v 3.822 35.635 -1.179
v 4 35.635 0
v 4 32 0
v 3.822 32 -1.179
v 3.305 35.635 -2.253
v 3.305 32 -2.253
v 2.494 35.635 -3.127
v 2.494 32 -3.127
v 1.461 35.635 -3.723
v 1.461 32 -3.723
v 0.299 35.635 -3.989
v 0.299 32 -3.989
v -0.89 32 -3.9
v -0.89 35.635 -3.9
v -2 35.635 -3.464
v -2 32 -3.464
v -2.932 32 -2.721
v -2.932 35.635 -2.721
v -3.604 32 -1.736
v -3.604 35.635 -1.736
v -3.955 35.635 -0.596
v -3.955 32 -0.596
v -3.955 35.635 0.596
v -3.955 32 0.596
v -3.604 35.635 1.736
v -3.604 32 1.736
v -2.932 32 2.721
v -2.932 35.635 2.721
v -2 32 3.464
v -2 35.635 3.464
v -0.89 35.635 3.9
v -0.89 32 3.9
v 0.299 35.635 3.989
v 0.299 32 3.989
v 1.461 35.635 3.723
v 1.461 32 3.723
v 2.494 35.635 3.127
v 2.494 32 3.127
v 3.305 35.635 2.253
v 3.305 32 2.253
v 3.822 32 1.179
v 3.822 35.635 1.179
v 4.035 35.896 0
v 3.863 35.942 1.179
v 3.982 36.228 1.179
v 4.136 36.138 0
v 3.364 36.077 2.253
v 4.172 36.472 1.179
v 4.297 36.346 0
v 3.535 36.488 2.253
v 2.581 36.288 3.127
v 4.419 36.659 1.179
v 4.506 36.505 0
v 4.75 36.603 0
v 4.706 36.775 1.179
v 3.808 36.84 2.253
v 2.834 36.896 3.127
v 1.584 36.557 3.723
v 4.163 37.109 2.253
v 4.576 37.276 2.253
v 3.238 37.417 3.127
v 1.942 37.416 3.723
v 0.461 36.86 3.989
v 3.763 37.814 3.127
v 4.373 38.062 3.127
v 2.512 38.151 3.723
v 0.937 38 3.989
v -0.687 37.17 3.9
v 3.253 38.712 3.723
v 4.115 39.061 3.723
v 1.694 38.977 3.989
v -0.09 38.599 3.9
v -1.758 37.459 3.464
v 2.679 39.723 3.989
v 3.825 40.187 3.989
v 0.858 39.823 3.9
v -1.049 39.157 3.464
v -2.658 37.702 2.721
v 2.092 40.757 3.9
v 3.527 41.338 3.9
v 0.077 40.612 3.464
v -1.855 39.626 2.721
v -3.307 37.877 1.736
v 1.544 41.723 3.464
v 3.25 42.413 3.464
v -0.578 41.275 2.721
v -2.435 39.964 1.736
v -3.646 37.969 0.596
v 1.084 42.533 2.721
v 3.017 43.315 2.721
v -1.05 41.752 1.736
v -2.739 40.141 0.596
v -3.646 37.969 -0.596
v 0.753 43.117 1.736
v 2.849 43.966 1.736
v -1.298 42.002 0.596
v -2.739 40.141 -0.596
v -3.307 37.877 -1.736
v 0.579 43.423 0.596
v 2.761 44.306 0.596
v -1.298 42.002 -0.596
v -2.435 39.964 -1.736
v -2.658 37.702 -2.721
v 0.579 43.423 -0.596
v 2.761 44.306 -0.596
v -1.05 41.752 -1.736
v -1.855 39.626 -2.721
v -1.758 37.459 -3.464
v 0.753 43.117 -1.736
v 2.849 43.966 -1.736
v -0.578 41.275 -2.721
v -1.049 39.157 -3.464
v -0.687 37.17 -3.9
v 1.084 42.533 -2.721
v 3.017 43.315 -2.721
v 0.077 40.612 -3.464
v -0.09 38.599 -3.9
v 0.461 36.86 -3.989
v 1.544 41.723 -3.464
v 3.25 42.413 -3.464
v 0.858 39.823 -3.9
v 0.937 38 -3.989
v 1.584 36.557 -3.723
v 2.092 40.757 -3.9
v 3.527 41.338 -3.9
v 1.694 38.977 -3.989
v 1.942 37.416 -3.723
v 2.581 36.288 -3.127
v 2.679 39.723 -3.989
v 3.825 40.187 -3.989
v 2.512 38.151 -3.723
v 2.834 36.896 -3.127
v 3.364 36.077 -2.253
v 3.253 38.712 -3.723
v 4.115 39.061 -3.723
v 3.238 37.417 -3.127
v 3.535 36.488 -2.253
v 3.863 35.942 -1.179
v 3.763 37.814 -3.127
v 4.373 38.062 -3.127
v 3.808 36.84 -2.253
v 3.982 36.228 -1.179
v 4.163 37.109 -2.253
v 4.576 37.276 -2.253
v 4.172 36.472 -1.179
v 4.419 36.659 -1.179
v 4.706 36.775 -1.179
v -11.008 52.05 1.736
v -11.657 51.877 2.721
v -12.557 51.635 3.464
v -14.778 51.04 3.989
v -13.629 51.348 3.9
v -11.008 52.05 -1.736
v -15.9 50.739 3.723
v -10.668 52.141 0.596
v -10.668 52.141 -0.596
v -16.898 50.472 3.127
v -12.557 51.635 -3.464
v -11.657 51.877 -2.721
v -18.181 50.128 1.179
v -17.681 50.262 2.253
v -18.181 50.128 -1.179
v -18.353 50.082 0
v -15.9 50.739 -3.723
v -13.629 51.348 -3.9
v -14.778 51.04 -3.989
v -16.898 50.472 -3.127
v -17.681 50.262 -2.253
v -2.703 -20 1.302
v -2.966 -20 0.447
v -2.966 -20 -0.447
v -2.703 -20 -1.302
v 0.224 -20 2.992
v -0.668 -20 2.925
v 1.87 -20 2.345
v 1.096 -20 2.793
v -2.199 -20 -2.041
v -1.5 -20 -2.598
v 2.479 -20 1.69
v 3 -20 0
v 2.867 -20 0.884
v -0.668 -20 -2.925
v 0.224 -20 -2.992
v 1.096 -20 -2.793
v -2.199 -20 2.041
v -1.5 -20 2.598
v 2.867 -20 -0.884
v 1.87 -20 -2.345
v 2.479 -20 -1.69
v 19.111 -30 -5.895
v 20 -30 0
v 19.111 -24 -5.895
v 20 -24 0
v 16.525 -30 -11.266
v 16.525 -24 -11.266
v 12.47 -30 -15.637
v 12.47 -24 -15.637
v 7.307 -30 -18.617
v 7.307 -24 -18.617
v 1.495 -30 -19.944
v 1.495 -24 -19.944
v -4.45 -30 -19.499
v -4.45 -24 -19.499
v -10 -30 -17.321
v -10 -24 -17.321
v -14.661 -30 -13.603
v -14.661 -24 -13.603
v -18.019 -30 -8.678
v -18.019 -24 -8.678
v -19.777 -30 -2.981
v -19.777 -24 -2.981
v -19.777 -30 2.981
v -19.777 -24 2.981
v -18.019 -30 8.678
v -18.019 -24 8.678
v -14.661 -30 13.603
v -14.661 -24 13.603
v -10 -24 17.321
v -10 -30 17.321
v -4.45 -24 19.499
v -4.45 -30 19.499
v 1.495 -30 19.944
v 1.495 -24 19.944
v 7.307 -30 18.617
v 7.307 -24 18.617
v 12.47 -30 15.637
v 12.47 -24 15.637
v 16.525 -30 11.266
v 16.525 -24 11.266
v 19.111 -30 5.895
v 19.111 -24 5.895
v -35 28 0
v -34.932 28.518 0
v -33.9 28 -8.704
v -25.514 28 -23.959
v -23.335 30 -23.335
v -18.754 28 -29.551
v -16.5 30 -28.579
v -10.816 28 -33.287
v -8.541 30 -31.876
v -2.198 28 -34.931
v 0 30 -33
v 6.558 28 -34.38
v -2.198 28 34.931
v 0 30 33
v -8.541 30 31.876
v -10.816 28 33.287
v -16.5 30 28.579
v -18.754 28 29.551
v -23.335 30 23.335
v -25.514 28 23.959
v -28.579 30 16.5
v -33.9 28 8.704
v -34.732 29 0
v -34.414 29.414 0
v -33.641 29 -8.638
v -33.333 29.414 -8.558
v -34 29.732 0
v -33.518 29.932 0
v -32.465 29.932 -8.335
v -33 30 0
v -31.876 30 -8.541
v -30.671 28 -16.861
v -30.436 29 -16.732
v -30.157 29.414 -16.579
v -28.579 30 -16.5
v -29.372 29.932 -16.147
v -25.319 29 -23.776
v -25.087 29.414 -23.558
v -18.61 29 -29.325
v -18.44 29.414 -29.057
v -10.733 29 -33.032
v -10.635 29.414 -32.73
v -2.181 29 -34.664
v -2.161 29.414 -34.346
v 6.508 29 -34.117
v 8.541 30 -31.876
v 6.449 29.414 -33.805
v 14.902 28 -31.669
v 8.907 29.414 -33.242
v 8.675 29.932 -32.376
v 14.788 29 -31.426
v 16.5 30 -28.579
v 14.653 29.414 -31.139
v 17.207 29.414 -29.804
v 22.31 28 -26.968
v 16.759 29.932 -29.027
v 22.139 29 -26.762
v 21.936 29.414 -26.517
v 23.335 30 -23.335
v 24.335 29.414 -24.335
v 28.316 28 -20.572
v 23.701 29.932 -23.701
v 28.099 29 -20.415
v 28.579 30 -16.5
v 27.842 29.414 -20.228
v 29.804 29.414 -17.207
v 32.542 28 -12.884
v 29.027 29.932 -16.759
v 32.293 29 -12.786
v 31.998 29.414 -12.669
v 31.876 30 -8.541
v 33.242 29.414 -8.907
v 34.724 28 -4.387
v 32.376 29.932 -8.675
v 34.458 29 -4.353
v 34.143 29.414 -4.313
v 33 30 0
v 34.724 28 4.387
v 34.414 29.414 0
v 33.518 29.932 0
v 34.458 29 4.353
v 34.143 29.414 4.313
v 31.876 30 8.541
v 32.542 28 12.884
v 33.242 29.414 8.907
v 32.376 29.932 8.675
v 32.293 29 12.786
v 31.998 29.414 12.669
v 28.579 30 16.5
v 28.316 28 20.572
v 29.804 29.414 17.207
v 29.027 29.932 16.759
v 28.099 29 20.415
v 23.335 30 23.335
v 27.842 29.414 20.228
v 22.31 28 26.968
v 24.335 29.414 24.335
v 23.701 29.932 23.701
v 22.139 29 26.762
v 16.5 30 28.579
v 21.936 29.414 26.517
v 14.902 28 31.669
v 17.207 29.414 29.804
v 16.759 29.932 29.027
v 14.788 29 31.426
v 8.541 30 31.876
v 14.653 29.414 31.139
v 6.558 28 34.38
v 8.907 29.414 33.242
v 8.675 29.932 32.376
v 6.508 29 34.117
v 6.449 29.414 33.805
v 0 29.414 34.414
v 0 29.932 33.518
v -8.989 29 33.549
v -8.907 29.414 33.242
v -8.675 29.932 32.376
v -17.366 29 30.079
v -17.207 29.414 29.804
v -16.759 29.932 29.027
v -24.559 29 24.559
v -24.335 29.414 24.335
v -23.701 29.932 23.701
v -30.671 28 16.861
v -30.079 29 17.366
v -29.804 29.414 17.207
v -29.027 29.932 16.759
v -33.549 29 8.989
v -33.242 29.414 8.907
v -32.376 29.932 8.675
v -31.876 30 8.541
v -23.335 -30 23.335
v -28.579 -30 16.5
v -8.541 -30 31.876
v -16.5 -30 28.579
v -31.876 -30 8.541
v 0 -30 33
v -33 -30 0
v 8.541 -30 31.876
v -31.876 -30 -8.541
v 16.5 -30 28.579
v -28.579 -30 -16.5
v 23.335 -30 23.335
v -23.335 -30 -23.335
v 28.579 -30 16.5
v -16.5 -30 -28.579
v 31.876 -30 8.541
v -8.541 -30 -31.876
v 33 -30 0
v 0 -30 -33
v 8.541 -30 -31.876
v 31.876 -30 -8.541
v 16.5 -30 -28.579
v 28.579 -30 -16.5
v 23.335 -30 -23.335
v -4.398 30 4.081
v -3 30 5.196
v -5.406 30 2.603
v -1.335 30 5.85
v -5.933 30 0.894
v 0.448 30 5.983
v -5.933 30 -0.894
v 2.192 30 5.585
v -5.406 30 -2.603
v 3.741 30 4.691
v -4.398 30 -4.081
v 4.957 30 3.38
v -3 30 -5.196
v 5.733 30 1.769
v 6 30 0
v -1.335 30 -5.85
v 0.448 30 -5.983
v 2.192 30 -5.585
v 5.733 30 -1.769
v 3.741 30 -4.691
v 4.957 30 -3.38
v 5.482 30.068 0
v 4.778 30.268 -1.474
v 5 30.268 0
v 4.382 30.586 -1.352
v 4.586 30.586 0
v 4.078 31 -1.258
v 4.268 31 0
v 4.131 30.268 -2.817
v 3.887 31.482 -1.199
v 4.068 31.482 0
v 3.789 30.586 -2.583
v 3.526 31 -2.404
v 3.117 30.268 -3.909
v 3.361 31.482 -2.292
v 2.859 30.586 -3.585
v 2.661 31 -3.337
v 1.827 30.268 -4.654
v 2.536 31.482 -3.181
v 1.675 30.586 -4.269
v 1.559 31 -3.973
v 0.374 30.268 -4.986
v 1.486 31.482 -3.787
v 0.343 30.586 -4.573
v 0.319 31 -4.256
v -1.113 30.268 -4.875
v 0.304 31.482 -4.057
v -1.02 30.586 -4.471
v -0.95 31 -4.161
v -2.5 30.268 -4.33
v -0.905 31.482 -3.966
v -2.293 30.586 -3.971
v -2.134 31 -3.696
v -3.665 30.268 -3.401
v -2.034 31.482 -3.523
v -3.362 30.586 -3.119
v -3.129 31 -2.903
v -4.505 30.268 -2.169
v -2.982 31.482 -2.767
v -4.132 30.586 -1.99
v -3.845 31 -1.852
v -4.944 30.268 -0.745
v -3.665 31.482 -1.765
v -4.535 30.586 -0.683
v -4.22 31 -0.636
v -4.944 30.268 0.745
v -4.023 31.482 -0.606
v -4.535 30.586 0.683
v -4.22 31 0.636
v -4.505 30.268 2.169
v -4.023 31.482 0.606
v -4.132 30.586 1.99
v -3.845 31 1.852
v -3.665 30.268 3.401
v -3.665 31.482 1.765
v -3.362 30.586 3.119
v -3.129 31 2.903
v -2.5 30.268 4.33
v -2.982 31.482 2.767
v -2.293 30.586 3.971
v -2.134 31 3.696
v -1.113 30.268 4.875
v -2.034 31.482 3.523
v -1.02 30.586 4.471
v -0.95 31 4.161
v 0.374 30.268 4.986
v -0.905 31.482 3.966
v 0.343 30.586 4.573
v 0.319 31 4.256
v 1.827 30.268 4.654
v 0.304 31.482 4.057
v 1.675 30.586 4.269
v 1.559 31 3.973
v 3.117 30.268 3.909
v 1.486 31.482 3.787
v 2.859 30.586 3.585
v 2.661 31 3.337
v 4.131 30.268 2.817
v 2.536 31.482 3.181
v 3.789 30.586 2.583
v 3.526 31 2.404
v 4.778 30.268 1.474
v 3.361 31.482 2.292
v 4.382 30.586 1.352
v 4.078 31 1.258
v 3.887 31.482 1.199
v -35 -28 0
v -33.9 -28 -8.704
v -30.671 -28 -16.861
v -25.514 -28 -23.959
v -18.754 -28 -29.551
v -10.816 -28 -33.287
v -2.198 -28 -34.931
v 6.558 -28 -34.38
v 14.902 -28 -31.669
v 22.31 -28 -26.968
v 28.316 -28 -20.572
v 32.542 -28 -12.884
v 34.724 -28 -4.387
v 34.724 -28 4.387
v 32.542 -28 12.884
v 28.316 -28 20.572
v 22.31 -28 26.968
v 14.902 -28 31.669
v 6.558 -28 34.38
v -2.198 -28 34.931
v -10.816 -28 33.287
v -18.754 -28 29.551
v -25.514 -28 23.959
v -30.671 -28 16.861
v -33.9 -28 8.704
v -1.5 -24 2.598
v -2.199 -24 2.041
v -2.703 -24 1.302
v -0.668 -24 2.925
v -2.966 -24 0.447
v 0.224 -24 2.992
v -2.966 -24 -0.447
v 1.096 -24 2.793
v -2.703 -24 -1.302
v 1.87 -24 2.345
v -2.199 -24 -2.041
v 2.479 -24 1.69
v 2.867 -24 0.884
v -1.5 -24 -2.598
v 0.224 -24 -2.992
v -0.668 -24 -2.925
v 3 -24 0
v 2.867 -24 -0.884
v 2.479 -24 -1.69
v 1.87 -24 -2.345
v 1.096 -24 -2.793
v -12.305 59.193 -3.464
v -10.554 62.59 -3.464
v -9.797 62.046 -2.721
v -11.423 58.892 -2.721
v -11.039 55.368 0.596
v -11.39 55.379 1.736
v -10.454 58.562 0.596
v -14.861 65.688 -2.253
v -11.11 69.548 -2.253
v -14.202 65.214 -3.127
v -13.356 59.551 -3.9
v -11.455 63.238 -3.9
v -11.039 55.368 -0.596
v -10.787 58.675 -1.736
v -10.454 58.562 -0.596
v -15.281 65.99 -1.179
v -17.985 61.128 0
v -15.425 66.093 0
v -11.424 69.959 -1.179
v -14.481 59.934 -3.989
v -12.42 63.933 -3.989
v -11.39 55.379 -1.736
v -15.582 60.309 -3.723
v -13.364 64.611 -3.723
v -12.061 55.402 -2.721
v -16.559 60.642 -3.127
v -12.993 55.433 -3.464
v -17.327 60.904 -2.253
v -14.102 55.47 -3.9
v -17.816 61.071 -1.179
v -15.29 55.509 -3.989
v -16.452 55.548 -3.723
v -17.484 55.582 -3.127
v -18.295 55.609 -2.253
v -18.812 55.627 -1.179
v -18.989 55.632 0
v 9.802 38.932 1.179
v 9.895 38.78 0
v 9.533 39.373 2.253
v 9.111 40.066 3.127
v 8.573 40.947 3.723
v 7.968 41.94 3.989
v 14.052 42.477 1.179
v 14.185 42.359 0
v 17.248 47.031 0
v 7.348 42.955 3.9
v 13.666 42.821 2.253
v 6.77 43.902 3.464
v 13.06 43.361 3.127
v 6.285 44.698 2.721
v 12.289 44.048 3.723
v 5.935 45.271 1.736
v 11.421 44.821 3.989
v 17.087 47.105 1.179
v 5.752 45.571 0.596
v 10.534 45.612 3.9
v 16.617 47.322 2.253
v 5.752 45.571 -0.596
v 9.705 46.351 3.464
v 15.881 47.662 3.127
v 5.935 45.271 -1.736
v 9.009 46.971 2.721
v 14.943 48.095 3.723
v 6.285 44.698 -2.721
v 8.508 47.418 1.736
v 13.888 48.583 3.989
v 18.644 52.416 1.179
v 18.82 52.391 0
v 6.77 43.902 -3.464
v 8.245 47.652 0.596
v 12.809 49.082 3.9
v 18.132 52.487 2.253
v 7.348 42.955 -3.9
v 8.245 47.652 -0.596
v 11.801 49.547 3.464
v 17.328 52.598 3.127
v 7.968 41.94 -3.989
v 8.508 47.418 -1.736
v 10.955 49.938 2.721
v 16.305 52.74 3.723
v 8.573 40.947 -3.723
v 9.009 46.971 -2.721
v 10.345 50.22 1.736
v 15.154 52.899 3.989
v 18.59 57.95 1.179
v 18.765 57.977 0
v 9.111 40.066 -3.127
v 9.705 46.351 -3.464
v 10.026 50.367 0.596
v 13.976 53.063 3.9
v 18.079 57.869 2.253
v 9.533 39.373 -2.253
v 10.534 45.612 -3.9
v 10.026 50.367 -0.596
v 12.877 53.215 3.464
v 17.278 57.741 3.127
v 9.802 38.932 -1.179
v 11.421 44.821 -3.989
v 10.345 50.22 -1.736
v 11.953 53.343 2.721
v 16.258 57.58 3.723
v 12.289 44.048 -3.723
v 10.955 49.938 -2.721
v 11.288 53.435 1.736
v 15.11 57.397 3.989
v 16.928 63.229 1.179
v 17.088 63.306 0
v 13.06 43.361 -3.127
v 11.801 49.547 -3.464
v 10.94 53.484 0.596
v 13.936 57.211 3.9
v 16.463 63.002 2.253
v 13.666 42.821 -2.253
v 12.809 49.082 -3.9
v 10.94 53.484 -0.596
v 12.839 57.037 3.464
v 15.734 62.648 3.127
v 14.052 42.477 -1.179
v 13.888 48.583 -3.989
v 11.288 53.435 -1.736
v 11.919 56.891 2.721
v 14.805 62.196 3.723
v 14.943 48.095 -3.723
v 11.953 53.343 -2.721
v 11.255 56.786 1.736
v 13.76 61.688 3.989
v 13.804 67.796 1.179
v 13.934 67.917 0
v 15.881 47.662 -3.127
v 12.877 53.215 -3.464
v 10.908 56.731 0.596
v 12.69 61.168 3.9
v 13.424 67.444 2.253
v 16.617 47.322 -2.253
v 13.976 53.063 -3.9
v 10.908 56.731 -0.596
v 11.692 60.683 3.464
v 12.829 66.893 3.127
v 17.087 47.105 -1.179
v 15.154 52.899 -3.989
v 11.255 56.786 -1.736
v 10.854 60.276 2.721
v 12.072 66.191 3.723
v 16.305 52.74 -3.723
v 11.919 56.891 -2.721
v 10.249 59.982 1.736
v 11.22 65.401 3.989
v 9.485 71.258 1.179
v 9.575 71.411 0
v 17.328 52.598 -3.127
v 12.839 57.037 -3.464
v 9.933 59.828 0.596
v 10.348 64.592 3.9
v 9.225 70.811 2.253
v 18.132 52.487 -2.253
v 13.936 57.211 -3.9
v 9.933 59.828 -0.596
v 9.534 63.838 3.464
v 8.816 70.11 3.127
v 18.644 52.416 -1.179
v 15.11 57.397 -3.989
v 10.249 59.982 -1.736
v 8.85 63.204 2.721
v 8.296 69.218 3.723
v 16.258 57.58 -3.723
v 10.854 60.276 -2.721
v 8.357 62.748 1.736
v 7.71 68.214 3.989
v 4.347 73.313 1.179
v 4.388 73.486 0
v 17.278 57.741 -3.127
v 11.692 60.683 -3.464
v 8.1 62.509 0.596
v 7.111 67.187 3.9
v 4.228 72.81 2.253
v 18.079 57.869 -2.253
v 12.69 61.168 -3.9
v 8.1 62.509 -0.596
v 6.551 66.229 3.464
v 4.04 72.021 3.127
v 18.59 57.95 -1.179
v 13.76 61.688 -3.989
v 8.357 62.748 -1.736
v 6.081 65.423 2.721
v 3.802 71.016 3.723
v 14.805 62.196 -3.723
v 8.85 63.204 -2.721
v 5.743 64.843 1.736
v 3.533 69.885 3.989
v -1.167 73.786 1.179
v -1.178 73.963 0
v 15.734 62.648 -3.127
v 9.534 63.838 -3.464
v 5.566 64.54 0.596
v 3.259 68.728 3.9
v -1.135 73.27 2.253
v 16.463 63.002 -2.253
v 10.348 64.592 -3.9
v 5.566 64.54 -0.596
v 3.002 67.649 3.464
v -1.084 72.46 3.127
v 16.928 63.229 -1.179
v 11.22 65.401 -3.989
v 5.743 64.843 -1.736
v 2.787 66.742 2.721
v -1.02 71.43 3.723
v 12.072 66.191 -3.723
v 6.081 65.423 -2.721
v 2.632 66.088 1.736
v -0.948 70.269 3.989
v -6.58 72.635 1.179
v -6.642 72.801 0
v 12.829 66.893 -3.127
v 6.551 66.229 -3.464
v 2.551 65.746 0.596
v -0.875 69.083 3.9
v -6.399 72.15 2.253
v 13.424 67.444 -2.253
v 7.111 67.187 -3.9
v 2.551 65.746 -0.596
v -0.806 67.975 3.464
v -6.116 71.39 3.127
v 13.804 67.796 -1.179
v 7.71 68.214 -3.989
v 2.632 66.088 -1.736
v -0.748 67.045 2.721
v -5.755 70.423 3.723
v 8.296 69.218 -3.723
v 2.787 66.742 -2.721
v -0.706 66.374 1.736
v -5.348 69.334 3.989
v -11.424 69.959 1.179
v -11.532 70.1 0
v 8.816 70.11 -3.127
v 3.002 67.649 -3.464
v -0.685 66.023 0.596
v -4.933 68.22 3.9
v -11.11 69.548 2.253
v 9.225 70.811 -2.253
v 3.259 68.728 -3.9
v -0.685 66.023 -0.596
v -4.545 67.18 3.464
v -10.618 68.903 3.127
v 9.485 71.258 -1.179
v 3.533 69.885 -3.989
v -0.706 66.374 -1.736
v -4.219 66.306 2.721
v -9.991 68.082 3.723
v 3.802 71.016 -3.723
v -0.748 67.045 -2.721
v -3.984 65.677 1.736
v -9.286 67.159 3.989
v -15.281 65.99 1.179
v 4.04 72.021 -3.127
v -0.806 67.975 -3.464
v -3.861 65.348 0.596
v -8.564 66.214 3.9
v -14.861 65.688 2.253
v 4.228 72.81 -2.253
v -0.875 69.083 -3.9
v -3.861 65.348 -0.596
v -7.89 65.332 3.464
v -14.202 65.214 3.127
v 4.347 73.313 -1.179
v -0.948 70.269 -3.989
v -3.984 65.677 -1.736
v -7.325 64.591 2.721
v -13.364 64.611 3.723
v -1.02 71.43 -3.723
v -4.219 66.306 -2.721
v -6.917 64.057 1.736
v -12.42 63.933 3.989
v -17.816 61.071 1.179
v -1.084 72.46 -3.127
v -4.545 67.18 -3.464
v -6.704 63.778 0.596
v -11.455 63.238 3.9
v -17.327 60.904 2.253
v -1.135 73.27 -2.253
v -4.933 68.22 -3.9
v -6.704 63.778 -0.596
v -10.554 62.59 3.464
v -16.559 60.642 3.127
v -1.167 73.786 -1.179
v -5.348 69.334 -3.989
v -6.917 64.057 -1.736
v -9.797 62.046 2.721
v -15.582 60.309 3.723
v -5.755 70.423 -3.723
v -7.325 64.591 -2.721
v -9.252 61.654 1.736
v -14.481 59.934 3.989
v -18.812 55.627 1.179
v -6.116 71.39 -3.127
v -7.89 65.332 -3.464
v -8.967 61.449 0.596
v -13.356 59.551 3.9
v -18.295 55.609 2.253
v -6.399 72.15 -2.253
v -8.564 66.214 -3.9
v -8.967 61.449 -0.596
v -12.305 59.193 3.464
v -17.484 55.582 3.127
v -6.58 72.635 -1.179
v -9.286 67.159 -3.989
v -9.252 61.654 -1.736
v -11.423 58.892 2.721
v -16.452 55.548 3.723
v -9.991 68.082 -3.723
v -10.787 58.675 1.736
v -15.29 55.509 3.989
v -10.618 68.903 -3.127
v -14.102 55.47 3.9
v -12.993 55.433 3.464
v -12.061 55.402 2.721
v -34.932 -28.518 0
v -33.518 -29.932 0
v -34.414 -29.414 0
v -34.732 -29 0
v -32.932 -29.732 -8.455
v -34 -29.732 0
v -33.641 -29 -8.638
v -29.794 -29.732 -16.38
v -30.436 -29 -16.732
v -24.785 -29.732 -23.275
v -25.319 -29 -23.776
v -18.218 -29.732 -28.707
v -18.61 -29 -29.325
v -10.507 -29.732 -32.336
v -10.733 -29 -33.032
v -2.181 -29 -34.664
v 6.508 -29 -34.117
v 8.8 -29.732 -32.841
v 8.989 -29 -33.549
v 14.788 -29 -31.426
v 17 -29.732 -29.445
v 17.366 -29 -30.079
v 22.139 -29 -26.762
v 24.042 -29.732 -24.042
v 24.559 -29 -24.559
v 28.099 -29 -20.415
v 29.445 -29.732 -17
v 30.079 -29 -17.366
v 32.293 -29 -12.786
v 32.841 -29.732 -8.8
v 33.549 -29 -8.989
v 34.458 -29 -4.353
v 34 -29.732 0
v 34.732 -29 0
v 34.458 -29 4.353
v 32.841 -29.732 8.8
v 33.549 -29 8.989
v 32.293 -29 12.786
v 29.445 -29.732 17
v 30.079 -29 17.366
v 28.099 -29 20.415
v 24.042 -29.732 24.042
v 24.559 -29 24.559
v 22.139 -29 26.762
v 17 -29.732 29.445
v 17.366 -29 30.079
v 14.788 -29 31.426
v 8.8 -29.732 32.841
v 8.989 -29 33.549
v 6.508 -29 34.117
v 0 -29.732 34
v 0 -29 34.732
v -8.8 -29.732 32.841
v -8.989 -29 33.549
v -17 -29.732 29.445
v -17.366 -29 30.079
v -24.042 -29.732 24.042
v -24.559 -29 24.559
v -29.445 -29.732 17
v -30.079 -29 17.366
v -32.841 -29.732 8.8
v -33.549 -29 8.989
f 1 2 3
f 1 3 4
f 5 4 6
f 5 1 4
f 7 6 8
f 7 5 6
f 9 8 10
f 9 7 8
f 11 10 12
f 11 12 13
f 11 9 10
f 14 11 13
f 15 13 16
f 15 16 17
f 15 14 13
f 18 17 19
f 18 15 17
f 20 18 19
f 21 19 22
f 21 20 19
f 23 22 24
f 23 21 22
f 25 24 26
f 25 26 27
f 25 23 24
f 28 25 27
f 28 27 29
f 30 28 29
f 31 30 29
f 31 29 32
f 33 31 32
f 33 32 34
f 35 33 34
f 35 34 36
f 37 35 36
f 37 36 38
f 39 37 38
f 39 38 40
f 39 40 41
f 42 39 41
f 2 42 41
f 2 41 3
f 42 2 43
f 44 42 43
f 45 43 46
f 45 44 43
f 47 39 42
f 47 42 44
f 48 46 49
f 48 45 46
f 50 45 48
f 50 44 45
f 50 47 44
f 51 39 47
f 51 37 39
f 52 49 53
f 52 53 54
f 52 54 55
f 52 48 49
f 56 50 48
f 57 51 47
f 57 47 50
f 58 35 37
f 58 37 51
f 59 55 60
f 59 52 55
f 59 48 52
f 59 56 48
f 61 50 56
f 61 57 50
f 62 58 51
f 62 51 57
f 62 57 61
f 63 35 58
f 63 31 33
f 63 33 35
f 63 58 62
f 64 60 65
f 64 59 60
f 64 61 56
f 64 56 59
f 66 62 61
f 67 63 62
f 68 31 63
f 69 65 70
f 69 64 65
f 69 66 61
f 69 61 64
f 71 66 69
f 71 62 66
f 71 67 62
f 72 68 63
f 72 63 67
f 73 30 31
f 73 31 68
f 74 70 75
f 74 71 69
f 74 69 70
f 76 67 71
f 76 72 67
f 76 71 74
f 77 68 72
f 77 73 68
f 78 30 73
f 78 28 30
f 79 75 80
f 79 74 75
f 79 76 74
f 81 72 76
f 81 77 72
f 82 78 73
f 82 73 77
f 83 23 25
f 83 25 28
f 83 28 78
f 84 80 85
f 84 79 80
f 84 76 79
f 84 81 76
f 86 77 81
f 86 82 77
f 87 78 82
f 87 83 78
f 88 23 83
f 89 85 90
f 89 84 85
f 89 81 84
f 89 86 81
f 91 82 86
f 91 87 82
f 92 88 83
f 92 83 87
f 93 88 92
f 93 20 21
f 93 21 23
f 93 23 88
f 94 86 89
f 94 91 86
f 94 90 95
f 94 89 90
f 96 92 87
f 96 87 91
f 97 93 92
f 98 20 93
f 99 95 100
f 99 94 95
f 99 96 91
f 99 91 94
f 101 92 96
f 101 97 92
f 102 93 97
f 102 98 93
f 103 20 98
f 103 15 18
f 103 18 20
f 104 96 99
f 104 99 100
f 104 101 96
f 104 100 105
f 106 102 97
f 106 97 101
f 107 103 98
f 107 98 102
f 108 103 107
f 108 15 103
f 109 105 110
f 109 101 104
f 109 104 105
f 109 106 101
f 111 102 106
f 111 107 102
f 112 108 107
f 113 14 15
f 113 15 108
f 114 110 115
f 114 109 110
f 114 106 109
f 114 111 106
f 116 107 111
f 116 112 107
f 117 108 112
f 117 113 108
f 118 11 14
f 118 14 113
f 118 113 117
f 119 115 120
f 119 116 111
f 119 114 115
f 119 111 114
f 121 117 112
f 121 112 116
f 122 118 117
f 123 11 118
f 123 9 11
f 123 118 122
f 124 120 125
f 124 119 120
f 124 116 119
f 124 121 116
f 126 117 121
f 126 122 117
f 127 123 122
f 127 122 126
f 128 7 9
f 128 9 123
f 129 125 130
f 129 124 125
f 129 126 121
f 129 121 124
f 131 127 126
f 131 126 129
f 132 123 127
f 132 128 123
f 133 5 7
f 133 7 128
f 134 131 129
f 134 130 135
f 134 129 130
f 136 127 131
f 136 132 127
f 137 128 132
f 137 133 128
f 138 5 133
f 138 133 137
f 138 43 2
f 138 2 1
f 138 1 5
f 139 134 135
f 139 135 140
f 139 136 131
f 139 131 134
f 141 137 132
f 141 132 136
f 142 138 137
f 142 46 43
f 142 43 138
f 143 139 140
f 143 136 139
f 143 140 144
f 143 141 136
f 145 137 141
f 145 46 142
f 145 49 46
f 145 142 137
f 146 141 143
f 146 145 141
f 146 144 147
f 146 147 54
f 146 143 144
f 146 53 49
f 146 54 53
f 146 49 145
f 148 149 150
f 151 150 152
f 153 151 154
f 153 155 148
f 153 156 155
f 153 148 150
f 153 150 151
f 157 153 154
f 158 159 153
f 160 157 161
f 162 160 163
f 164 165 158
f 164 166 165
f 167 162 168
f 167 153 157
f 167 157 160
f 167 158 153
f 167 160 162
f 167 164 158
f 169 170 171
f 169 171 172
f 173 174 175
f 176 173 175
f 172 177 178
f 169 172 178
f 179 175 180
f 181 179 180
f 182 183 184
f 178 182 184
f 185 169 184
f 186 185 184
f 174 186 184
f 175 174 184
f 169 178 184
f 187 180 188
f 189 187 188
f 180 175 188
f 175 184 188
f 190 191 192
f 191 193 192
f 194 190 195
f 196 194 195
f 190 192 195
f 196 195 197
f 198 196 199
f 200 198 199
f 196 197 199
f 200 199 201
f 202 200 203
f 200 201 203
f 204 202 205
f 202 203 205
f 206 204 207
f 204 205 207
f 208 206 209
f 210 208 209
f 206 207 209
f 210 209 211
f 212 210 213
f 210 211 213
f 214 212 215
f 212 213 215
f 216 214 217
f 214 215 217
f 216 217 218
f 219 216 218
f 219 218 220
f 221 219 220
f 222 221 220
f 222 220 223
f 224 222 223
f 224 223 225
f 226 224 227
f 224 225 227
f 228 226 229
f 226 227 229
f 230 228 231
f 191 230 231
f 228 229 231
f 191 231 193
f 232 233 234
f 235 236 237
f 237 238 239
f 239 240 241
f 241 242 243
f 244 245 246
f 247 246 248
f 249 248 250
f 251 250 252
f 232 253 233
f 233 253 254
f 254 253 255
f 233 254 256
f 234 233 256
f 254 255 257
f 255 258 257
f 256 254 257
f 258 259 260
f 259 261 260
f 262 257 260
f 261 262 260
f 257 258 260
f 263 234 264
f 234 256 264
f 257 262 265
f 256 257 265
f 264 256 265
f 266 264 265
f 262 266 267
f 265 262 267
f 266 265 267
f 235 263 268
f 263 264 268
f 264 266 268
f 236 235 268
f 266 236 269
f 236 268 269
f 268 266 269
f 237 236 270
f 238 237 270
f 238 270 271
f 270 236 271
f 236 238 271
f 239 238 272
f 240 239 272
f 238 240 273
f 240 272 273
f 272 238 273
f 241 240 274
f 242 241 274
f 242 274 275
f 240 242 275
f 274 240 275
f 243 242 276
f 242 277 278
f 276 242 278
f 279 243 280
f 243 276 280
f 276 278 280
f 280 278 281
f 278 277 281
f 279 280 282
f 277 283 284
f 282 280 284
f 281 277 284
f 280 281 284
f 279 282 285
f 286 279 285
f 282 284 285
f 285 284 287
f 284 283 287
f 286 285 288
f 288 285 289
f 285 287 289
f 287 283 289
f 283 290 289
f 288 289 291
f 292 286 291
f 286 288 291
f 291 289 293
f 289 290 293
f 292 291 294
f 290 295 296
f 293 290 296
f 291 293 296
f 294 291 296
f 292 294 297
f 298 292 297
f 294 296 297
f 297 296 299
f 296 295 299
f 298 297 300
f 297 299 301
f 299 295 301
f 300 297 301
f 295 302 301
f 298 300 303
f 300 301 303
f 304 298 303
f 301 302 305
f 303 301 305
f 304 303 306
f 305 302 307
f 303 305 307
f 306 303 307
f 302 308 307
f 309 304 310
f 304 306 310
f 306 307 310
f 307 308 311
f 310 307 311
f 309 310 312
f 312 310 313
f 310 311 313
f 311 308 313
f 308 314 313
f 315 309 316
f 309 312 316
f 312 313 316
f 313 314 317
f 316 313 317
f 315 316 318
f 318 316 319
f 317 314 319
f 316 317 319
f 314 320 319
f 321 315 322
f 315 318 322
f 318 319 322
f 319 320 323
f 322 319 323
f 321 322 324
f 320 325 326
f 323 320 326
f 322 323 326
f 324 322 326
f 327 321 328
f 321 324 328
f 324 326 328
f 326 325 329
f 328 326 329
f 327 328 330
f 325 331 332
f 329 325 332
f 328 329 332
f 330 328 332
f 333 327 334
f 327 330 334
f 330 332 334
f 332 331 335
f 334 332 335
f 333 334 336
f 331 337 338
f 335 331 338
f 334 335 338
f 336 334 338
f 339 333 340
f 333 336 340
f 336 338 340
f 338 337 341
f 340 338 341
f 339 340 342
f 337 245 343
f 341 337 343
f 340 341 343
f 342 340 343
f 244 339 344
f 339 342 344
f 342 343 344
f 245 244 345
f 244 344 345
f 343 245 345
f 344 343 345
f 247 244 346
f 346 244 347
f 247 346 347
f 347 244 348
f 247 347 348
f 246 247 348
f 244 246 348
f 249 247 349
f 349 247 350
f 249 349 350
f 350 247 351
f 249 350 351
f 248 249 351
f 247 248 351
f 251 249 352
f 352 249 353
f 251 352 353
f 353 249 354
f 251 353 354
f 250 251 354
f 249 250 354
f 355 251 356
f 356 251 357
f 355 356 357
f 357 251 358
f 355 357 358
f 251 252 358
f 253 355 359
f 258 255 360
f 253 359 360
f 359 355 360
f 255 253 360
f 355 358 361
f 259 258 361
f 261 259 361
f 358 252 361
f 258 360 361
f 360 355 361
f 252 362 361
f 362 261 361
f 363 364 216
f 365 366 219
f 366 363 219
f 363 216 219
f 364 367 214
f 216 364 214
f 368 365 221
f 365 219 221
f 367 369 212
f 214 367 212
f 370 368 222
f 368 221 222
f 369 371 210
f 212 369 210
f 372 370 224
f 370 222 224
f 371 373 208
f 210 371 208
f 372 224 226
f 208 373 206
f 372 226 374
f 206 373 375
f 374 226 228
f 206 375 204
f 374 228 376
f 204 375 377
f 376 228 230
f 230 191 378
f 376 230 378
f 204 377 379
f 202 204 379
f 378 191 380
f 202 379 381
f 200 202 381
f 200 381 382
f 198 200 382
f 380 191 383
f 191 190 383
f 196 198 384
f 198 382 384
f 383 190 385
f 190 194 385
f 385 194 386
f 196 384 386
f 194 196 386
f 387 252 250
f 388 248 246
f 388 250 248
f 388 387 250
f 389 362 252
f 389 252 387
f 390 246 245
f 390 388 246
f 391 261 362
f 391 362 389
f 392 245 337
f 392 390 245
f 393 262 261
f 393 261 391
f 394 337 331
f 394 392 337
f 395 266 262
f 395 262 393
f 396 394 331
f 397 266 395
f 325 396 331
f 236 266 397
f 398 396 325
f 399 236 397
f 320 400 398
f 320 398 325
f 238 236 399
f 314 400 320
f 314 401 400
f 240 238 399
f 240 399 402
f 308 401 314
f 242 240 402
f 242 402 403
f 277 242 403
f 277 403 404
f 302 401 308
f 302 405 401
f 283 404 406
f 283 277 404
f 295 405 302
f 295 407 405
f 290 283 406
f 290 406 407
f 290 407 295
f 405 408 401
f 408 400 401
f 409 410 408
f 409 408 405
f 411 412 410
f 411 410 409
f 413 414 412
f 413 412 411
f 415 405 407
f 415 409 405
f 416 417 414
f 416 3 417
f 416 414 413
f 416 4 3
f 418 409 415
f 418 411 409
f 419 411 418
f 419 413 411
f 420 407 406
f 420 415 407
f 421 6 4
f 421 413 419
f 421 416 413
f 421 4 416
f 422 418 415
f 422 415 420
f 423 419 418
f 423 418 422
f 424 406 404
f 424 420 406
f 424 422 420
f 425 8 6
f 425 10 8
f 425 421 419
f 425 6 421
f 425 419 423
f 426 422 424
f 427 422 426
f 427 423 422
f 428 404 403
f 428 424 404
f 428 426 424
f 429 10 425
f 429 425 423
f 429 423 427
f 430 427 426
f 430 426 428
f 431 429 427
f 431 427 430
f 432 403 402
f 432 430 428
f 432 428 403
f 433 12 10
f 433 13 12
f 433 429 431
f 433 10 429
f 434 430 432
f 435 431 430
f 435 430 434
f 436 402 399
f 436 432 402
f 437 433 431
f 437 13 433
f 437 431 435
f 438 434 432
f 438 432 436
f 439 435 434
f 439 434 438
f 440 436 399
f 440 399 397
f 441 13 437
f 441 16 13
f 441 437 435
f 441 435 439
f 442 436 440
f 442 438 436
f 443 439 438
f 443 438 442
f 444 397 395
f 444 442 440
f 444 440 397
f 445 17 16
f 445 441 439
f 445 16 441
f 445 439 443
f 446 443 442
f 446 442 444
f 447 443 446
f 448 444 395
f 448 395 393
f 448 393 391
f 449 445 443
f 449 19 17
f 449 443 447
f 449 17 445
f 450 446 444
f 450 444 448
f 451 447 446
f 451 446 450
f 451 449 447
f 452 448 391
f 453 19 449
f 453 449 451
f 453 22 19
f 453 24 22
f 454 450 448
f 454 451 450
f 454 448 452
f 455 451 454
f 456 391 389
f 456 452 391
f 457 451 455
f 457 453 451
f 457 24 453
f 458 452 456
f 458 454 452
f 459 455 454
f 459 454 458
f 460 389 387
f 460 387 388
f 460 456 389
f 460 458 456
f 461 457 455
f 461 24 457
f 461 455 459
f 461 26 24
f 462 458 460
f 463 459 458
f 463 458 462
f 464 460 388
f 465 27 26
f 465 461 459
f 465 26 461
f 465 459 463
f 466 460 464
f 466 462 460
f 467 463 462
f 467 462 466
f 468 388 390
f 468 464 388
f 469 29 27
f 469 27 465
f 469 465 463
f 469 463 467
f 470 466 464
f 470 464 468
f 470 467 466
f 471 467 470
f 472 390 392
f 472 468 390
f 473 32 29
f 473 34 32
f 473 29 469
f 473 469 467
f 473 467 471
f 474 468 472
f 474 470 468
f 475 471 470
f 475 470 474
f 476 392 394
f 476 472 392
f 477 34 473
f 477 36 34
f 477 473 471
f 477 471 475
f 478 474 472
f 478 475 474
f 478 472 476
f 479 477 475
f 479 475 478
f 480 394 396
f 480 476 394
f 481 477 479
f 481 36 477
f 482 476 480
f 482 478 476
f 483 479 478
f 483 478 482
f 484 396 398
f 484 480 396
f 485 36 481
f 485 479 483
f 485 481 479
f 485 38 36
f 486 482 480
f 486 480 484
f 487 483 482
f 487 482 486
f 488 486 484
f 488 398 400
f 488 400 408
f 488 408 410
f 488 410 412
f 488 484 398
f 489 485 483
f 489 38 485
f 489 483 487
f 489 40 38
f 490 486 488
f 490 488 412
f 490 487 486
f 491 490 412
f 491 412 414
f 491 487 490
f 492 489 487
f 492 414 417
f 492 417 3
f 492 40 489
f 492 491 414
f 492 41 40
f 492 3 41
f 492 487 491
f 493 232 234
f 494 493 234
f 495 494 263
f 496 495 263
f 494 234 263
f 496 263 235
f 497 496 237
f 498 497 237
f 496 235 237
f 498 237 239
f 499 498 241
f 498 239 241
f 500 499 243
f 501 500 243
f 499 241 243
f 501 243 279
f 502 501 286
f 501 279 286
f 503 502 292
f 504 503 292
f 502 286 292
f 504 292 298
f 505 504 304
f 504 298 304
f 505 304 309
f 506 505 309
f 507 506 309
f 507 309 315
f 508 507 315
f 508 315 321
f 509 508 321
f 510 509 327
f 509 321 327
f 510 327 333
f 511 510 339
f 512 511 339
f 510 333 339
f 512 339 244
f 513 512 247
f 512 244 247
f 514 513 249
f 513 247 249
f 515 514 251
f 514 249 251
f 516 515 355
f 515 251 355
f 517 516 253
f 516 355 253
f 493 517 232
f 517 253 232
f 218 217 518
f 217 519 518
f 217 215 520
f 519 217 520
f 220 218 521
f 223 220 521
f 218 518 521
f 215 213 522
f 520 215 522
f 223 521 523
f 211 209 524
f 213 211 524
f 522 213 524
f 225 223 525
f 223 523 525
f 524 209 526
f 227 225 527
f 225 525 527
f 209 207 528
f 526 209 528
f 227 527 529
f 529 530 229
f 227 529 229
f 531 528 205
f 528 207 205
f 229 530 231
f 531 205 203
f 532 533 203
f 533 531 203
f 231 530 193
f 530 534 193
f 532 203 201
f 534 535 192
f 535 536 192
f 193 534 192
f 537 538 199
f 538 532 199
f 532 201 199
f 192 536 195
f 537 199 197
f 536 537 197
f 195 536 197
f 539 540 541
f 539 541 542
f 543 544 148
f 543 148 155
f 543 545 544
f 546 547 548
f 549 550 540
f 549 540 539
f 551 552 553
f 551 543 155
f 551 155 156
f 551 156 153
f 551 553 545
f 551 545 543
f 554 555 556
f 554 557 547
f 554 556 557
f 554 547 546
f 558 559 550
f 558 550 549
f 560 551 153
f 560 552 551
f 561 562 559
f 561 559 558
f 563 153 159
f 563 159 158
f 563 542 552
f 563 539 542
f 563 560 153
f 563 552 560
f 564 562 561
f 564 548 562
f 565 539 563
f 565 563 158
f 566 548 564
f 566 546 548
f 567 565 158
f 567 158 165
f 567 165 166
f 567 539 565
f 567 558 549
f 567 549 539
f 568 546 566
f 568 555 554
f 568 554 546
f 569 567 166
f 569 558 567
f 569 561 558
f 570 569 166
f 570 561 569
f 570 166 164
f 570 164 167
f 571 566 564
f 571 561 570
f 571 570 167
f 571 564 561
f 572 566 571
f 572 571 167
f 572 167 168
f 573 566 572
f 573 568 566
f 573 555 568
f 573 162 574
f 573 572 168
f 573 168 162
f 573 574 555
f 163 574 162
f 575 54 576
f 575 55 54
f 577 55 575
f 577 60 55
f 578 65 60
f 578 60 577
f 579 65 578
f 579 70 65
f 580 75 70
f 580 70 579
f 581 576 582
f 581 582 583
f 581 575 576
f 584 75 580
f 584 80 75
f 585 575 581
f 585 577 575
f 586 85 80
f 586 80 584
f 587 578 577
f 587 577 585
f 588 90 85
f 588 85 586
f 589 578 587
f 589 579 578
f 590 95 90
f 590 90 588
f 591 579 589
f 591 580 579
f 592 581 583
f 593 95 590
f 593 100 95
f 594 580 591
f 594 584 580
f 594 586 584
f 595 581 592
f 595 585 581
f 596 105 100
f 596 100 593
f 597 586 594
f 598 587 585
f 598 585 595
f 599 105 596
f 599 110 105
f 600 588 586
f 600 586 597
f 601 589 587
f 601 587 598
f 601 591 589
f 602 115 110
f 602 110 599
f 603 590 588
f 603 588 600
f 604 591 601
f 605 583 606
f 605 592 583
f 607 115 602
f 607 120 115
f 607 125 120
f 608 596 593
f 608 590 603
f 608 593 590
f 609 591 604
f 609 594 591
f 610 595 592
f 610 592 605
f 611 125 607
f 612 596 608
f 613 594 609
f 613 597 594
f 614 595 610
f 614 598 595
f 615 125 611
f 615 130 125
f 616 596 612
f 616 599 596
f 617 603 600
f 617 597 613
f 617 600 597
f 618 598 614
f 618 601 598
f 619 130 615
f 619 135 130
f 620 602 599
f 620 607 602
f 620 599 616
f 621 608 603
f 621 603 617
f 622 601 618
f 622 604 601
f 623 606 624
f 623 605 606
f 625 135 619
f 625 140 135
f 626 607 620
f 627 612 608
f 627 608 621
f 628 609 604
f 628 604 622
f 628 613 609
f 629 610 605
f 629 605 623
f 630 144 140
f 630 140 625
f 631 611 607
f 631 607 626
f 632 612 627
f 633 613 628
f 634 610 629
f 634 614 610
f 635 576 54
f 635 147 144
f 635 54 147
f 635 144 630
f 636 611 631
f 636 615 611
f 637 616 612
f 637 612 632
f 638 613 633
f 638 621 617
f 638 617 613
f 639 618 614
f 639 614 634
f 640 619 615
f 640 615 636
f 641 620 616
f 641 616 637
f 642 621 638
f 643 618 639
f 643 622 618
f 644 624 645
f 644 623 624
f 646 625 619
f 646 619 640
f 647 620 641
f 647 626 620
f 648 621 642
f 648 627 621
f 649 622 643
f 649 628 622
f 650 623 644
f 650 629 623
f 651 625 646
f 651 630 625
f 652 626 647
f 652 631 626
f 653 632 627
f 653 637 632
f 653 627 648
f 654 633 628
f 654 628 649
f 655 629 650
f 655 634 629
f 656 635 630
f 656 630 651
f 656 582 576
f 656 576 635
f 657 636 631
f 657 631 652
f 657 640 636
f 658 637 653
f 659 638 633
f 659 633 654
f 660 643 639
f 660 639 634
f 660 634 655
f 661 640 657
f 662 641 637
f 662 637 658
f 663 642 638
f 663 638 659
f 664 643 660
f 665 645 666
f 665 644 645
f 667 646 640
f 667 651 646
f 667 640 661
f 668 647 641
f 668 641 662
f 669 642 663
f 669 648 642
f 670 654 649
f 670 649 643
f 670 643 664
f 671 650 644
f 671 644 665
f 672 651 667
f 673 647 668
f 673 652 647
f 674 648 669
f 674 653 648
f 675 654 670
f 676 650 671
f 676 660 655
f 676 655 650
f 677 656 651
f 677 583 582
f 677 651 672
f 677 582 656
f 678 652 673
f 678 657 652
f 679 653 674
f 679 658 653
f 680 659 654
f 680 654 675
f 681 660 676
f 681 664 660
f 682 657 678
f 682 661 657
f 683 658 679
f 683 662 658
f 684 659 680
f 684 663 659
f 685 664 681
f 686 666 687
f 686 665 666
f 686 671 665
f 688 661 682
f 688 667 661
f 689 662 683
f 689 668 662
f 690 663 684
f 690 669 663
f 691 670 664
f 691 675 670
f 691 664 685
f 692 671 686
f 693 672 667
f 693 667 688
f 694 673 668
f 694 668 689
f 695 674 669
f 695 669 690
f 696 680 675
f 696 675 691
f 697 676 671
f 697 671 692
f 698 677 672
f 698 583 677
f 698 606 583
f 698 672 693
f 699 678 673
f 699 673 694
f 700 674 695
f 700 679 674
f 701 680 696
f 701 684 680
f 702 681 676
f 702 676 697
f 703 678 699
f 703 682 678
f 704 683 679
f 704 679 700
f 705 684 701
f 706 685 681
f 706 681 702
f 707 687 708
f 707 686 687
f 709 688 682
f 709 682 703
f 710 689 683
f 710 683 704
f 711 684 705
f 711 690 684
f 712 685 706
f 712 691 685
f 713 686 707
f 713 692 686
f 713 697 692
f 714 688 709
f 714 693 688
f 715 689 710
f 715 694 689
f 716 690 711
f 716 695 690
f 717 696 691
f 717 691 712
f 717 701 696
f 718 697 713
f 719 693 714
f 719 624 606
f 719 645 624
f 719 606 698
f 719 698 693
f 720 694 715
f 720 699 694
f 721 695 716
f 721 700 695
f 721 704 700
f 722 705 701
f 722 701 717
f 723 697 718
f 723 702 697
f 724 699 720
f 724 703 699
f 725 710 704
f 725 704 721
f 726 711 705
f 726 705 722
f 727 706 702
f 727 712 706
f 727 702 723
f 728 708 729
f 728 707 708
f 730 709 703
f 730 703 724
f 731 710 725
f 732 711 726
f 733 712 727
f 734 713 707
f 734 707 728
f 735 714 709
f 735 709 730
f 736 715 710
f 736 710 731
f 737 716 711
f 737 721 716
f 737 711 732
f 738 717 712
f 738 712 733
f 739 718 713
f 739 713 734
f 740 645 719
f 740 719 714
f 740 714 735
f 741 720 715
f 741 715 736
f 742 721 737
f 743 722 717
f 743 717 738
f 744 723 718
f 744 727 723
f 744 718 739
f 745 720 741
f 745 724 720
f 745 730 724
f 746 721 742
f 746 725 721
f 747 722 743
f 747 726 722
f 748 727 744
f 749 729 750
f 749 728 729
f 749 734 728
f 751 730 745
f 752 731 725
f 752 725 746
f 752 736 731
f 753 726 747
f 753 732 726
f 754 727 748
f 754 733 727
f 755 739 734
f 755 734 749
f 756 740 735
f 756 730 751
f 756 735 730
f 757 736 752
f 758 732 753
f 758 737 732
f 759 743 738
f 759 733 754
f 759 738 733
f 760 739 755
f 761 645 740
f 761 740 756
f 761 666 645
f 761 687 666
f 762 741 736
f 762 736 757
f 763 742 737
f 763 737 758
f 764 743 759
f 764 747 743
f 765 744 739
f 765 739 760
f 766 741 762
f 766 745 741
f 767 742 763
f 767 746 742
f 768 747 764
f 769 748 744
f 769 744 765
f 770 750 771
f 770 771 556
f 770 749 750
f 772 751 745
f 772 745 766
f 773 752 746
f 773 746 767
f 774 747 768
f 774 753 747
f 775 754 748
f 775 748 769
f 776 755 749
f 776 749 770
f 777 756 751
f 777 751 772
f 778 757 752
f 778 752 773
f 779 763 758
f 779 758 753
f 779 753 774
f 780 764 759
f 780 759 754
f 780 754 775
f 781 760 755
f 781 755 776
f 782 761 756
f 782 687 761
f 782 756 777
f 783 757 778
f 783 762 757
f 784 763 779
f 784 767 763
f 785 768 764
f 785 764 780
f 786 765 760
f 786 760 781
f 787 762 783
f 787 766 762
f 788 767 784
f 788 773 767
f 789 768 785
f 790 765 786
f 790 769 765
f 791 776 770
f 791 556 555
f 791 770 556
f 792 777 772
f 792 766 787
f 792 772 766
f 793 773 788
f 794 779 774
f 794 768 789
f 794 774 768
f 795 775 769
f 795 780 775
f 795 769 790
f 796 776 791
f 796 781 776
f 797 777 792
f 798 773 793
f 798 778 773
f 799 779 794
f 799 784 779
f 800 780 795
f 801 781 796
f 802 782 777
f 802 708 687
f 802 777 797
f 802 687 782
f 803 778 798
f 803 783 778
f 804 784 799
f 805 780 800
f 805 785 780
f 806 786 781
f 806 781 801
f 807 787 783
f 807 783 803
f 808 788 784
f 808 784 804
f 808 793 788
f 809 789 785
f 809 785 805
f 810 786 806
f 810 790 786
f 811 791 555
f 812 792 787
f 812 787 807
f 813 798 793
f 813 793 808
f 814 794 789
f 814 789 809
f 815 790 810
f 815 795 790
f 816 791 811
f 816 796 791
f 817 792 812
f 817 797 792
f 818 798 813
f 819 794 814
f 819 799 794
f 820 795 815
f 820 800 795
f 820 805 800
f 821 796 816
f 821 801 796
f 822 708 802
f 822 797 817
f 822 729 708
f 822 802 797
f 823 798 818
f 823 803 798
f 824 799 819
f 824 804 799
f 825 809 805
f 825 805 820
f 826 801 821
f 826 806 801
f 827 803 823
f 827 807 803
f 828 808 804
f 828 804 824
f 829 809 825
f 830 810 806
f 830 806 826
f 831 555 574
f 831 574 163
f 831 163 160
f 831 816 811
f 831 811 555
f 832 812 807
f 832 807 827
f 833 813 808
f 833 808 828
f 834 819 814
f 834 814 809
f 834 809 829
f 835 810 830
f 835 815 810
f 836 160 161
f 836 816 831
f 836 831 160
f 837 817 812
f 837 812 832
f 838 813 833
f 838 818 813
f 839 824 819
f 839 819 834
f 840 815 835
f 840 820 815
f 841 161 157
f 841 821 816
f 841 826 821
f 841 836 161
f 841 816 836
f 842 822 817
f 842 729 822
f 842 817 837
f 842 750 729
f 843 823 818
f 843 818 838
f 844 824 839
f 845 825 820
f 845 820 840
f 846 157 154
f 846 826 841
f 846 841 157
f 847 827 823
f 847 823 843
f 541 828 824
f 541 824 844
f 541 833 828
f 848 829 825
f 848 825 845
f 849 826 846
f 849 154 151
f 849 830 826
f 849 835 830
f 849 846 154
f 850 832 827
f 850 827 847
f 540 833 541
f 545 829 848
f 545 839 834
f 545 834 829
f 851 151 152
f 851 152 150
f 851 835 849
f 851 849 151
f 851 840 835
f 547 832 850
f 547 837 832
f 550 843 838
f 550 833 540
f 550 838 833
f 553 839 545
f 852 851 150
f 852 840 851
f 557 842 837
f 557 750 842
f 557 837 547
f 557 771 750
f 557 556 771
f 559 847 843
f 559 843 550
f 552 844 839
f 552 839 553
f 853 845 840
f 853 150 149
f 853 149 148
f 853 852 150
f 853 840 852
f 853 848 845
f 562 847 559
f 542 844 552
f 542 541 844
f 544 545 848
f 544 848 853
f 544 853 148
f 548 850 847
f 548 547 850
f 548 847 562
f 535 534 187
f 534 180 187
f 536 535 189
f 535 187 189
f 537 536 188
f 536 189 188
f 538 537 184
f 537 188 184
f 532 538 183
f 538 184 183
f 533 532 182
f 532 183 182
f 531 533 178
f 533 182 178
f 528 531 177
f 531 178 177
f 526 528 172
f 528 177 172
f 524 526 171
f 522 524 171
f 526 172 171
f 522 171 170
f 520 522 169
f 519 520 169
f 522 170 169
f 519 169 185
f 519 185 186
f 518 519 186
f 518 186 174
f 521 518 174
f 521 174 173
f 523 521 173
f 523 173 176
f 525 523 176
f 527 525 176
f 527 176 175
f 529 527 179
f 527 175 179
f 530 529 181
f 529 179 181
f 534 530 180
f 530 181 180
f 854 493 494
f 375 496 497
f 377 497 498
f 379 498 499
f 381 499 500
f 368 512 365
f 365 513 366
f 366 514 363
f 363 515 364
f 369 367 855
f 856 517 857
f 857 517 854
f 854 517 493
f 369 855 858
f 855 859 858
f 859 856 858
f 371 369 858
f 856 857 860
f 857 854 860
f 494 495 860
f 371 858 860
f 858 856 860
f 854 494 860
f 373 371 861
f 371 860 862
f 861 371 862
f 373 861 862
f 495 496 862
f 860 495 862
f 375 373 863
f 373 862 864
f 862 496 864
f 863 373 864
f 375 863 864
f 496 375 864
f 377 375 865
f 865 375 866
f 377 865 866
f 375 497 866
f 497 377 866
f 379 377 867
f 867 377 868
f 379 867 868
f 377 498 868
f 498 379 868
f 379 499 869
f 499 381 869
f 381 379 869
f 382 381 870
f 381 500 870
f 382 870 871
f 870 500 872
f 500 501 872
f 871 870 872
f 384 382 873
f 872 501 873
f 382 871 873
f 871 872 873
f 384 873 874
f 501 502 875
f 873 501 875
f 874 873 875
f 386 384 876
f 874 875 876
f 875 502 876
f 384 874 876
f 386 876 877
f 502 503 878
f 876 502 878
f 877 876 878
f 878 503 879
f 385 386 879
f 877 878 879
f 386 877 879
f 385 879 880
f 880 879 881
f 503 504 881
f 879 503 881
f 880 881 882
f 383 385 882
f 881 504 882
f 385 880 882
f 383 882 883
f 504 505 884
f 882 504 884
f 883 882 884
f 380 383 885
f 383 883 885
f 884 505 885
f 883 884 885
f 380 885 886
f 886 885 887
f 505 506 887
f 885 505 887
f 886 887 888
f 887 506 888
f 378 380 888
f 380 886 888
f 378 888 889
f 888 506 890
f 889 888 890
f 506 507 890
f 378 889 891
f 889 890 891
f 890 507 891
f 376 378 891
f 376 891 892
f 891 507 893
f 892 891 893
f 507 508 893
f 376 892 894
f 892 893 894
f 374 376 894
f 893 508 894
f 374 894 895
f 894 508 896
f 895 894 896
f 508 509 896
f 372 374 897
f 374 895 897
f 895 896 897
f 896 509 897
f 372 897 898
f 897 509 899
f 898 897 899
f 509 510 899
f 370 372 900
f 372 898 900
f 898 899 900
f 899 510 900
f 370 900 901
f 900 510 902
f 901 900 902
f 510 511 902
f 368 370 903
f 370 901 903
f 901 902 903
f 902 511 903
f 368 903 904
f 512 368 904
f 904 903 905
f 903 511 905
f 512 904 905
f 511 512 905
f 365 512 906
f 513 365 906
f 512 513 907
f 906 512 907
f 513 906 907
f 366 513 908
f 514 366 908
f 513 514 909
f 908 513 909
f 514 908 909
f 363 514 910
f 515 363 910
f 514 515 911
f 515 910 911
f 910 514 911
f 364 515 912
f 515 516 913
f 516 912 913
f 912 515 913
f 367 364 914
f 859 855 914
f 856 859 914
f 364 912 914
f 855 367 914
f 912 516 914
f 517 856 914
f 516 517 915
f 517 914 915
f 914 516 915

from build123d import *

# Parameters (mm, degrees)
SKETCH1_W   = 35
SKETCH1_H   = 60
FILLET1_R   = 2
SKETCH3_R   = 4
FILLET2_R   = 2
SKETCH4_W   = 20
SKETCH4_H   = 6
SKETCH4_W_2 = 3
SKETCH4_H_2 = 4


with BuildPart() as part:
    # Sketch1 → Revolve1 (revolve)
    with BuildSketch(Plane.XY, mode=Mode.PRIVATE) as revolve1_sk:
        with Locations((17.5, 0)):
            Rectangle(SKETCH1_W, SKETCH1_H)
    revolve(revolve1_sk.sketch.rotate(Axis((0, 30, 0), (0, -1, 0)), 180), axis=Axis((0, 30, 0), (0, -1, 0)))

    # Fillet1
    fillet1_edges = [part.edges().sort_by_distance(p)[0] for p in [
        (35, -30, 0),
        (35, 30, 0),
    ]]
    fillet(fillet1_edges, radius=FILLET1_R)

    # Sweep1: sweep along a path in Sketch2
    with BuildLine(Plane.XY) as sweep1_path:
        Line((0, 30), (0, 35.635083269))
        ThreePointArc((0, 35.635083269), (1.047152925, 38.696945447), (3.75, 40.476312452))
        ThreePointArc((3.75, 40.476312452), (7.559152338, 67.956049395), (-14.488887394, 51.117714323))
    # Sketch3 → Sweep1 (sweep)
    with BuildSketch(Plane(origin=(0, 30, 0), x_dir=(1, 0, 0), z_dir=(0, 1, 0))):
        Circle(SKETCH3_R)
    sweep(path=sweep1_path.line)

    # Fillet2
    fillet2_edges = [part.edges().sort_by_distance(p)[0] for p in [
        (-4, 30, 0),
    ]]
    fillet(fillet2_edges, radius=FILLET2_R)

    # Sketch4 → Cut-Revolve1 (revolve, cut)
    with BuildSketch(Plane(origin=(0, 0, 0), x_dir=(0, 0, -1), z_dir=(1, 0, 0)), mode=Mode.PRIVATE) as cut_revolve1_sk:
        with Locations((-10, -27)):
            Rectangle(SKETCH4_W, SKETCH4_H)
        with Locations((-1.5, -22)):
            Rectangle(SKETCH4_W_2, SKETCH4_H_2)
    revolve(cut_revolve1_sk.sketch.rotate(Axis((0, -30, 0), (0, 1, 0)), 90), axis=Axis((0, -30, 0), (0, 1, 0)), mode=Mode.SUBTRACT)


solid = part.part
